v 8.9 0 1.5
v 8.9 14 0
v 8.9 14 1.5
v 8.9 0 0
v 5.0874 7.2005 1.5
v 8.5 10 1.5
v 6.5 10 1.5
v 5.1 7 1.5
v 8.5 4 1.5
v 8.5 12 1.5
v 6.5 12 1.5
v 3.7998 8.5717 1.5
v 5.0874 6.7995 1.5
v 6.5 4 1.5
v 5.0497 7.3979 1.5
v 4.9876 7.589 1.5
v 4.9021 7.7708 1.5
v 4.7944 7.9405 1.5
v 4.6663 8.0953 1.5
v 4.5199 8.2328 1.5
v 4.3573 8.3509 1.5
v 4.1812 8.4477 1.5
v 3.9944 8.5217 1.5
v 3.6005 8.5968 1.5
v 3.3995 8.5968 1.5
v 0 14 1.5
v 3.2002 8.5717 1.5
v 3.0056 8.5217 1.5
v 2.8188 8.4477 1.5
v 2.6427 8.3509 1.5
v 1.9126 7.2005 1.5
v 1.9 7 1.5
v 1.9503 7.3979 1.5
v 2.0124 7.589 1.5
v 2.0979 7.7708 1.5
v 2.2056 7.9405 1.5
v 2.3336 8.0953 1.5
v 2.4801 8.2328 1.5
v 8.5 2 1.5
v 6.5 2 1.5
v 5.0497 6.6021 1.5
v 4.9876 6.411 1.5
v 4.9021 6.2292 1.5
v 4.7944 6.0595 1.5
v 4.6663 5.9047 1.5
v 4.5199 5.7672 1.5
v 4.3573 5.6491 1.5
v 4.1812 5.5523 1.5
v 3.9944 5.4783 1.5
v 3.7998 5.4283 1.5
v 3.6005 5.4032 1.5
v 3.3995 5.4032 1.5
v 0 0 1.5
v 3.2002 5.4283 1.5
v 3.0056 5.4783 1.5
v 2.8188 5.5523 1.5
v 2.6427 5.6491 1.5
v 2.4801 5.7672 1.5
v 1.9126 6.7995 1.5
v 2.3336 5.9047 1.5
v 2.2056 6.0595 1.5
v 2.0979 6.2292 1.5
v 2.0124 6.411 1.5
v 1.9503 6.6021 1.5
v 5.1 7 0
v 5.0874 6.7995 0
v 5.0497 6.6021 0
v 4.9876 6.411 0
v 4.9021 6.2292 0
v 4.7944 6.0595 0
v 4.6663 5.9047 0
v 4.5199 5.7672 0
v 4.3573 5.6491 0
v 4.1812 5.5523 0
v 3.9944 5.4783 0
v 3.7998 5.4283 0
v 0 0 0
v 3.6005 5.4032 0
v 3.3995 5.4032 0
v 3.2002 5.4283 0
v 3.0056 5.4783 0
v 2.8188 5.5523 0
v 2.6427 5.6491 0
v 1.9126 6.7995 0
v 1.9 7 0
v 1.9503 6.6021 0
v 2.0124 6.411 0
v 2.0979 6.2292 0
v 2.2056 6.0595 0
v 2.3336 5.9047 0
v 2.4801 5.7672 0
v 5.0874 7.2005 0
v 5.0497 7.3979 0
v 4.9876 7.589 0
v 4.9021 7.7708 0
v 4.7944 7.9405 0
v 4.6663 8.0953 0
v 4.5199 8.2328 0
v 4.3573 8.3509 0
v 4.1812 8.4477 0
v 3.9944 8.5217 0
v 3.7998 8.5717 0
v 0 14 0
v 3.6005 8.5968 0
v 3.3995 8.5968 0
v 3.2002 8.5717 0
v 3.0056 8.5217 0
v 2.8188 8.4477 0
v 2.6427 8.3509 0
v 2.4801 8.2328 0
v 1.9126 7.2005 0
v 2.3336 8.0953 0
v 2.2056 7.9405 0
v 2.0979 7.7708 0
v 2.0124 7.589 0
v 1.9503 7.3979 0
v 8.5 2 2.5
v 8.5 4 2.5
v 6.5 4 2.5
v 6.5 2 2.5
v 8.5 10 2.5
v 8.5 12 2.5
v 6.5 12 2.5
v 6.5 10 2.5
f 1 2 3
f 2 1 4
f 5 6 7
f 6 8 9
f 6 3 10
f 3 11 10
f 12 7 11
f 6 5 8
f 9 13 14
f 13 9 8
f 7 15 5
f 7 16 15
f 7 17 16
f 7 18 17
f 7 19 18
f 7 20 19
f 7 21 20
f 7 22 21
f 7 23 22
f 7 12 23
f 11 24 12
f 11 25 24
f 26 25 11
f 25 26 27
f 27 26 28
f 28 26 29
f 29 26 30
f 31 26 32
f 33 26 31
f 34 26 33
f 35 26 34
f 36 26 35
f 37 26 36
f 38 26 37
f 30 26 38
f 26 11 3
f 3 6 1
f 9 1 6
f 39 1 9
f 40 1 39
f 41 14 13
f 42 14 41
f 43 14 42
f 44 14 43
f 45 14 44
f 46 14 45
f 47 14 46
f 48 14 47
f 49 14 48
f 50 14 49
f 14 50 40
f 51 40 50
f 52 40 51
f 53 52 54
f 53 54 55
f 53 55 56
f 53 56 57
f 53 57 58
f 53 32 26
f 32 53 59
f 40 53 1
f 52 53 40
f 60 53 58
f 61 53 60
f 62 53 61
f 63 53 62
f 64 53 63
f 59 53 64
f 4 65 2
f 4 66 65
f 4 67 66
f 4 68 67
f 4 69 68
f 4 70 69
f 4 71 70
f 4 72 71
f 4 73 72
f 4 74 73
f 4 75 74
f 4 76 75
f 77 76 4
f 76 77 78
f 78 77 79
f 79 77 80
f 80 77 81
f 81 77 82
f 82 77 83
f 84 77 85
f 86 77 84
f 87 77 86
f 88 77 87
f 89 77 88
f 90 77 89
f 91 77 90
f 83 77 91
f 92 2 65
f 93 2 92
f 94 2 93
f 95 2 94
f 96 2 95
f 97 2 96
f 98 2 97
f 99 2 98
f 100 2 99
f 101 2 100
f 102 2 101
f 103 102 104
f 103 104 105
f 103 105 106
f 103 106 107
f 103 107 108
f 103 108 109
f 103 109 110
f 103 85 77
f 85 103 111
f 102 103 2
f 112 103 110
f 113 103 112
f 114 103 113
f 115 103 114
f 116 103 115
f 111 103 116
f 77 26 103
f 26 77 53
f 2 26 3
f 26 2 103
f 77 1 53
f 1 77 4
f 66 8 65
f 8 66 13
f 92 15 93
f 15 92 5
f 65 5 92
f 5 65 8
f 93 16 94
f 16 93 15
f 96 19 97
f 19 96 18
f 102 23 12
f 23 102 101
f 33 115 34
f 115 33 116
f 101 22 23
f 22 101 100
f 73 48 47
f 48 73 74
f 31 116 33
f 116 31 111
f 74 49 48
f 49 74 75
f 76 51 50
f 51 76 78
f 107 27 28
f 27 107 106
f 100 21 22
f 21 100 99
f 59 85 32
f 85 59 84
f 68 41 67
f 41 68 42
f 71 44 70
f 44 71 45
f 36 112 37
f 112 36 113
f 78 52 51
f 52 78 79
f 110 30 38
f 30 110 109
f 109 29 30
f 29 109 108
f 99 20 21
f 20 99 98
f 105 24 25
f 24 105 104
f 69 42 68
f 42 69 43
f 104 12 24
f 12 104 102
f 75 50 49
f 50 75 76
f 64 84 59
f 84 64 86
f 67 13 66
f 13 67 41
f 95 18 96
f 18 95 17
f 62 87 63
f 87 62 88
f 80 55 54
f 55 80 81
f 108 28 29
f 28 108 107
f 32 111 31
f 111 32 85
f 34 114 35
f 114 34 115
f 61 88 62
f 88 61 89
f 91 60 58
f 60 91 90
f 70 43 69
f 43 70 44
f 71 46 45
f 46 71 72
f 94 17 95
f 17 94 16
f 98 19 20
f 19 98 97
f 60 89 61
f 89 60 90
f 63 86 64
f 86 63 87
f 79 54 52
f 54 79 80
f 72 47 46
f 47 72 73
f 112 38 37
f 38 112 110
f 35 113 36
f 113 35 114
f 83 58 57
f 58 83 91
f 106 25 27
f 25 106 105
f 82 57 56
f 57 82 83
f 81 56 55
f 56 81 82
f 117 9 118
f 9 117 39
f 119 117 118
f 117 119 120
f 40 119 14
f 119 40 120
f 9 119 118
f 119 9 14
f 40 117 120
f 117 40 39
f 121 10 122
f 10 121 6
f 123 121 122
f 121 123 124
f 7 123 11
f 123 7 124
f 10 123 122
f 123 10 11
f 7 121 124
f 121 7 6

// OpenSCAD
module prusa_enclosure_mount_washer() {
    difference() {
        // Base
        cube([8.9, 14, 1.5]);

        // Through screw hole
        translate([3.5, 7, -1])
        cylinder(h=3.5, d=3.2, $fn=50);
    }
    
    translate([7.5, 3, 2])
    cube([2, 2, 1], center=true);
    
    translate([7.5, 11, 2])
    cube([2, 2, 1], center=true);
}

prusa_enclosure_mount_washer();
